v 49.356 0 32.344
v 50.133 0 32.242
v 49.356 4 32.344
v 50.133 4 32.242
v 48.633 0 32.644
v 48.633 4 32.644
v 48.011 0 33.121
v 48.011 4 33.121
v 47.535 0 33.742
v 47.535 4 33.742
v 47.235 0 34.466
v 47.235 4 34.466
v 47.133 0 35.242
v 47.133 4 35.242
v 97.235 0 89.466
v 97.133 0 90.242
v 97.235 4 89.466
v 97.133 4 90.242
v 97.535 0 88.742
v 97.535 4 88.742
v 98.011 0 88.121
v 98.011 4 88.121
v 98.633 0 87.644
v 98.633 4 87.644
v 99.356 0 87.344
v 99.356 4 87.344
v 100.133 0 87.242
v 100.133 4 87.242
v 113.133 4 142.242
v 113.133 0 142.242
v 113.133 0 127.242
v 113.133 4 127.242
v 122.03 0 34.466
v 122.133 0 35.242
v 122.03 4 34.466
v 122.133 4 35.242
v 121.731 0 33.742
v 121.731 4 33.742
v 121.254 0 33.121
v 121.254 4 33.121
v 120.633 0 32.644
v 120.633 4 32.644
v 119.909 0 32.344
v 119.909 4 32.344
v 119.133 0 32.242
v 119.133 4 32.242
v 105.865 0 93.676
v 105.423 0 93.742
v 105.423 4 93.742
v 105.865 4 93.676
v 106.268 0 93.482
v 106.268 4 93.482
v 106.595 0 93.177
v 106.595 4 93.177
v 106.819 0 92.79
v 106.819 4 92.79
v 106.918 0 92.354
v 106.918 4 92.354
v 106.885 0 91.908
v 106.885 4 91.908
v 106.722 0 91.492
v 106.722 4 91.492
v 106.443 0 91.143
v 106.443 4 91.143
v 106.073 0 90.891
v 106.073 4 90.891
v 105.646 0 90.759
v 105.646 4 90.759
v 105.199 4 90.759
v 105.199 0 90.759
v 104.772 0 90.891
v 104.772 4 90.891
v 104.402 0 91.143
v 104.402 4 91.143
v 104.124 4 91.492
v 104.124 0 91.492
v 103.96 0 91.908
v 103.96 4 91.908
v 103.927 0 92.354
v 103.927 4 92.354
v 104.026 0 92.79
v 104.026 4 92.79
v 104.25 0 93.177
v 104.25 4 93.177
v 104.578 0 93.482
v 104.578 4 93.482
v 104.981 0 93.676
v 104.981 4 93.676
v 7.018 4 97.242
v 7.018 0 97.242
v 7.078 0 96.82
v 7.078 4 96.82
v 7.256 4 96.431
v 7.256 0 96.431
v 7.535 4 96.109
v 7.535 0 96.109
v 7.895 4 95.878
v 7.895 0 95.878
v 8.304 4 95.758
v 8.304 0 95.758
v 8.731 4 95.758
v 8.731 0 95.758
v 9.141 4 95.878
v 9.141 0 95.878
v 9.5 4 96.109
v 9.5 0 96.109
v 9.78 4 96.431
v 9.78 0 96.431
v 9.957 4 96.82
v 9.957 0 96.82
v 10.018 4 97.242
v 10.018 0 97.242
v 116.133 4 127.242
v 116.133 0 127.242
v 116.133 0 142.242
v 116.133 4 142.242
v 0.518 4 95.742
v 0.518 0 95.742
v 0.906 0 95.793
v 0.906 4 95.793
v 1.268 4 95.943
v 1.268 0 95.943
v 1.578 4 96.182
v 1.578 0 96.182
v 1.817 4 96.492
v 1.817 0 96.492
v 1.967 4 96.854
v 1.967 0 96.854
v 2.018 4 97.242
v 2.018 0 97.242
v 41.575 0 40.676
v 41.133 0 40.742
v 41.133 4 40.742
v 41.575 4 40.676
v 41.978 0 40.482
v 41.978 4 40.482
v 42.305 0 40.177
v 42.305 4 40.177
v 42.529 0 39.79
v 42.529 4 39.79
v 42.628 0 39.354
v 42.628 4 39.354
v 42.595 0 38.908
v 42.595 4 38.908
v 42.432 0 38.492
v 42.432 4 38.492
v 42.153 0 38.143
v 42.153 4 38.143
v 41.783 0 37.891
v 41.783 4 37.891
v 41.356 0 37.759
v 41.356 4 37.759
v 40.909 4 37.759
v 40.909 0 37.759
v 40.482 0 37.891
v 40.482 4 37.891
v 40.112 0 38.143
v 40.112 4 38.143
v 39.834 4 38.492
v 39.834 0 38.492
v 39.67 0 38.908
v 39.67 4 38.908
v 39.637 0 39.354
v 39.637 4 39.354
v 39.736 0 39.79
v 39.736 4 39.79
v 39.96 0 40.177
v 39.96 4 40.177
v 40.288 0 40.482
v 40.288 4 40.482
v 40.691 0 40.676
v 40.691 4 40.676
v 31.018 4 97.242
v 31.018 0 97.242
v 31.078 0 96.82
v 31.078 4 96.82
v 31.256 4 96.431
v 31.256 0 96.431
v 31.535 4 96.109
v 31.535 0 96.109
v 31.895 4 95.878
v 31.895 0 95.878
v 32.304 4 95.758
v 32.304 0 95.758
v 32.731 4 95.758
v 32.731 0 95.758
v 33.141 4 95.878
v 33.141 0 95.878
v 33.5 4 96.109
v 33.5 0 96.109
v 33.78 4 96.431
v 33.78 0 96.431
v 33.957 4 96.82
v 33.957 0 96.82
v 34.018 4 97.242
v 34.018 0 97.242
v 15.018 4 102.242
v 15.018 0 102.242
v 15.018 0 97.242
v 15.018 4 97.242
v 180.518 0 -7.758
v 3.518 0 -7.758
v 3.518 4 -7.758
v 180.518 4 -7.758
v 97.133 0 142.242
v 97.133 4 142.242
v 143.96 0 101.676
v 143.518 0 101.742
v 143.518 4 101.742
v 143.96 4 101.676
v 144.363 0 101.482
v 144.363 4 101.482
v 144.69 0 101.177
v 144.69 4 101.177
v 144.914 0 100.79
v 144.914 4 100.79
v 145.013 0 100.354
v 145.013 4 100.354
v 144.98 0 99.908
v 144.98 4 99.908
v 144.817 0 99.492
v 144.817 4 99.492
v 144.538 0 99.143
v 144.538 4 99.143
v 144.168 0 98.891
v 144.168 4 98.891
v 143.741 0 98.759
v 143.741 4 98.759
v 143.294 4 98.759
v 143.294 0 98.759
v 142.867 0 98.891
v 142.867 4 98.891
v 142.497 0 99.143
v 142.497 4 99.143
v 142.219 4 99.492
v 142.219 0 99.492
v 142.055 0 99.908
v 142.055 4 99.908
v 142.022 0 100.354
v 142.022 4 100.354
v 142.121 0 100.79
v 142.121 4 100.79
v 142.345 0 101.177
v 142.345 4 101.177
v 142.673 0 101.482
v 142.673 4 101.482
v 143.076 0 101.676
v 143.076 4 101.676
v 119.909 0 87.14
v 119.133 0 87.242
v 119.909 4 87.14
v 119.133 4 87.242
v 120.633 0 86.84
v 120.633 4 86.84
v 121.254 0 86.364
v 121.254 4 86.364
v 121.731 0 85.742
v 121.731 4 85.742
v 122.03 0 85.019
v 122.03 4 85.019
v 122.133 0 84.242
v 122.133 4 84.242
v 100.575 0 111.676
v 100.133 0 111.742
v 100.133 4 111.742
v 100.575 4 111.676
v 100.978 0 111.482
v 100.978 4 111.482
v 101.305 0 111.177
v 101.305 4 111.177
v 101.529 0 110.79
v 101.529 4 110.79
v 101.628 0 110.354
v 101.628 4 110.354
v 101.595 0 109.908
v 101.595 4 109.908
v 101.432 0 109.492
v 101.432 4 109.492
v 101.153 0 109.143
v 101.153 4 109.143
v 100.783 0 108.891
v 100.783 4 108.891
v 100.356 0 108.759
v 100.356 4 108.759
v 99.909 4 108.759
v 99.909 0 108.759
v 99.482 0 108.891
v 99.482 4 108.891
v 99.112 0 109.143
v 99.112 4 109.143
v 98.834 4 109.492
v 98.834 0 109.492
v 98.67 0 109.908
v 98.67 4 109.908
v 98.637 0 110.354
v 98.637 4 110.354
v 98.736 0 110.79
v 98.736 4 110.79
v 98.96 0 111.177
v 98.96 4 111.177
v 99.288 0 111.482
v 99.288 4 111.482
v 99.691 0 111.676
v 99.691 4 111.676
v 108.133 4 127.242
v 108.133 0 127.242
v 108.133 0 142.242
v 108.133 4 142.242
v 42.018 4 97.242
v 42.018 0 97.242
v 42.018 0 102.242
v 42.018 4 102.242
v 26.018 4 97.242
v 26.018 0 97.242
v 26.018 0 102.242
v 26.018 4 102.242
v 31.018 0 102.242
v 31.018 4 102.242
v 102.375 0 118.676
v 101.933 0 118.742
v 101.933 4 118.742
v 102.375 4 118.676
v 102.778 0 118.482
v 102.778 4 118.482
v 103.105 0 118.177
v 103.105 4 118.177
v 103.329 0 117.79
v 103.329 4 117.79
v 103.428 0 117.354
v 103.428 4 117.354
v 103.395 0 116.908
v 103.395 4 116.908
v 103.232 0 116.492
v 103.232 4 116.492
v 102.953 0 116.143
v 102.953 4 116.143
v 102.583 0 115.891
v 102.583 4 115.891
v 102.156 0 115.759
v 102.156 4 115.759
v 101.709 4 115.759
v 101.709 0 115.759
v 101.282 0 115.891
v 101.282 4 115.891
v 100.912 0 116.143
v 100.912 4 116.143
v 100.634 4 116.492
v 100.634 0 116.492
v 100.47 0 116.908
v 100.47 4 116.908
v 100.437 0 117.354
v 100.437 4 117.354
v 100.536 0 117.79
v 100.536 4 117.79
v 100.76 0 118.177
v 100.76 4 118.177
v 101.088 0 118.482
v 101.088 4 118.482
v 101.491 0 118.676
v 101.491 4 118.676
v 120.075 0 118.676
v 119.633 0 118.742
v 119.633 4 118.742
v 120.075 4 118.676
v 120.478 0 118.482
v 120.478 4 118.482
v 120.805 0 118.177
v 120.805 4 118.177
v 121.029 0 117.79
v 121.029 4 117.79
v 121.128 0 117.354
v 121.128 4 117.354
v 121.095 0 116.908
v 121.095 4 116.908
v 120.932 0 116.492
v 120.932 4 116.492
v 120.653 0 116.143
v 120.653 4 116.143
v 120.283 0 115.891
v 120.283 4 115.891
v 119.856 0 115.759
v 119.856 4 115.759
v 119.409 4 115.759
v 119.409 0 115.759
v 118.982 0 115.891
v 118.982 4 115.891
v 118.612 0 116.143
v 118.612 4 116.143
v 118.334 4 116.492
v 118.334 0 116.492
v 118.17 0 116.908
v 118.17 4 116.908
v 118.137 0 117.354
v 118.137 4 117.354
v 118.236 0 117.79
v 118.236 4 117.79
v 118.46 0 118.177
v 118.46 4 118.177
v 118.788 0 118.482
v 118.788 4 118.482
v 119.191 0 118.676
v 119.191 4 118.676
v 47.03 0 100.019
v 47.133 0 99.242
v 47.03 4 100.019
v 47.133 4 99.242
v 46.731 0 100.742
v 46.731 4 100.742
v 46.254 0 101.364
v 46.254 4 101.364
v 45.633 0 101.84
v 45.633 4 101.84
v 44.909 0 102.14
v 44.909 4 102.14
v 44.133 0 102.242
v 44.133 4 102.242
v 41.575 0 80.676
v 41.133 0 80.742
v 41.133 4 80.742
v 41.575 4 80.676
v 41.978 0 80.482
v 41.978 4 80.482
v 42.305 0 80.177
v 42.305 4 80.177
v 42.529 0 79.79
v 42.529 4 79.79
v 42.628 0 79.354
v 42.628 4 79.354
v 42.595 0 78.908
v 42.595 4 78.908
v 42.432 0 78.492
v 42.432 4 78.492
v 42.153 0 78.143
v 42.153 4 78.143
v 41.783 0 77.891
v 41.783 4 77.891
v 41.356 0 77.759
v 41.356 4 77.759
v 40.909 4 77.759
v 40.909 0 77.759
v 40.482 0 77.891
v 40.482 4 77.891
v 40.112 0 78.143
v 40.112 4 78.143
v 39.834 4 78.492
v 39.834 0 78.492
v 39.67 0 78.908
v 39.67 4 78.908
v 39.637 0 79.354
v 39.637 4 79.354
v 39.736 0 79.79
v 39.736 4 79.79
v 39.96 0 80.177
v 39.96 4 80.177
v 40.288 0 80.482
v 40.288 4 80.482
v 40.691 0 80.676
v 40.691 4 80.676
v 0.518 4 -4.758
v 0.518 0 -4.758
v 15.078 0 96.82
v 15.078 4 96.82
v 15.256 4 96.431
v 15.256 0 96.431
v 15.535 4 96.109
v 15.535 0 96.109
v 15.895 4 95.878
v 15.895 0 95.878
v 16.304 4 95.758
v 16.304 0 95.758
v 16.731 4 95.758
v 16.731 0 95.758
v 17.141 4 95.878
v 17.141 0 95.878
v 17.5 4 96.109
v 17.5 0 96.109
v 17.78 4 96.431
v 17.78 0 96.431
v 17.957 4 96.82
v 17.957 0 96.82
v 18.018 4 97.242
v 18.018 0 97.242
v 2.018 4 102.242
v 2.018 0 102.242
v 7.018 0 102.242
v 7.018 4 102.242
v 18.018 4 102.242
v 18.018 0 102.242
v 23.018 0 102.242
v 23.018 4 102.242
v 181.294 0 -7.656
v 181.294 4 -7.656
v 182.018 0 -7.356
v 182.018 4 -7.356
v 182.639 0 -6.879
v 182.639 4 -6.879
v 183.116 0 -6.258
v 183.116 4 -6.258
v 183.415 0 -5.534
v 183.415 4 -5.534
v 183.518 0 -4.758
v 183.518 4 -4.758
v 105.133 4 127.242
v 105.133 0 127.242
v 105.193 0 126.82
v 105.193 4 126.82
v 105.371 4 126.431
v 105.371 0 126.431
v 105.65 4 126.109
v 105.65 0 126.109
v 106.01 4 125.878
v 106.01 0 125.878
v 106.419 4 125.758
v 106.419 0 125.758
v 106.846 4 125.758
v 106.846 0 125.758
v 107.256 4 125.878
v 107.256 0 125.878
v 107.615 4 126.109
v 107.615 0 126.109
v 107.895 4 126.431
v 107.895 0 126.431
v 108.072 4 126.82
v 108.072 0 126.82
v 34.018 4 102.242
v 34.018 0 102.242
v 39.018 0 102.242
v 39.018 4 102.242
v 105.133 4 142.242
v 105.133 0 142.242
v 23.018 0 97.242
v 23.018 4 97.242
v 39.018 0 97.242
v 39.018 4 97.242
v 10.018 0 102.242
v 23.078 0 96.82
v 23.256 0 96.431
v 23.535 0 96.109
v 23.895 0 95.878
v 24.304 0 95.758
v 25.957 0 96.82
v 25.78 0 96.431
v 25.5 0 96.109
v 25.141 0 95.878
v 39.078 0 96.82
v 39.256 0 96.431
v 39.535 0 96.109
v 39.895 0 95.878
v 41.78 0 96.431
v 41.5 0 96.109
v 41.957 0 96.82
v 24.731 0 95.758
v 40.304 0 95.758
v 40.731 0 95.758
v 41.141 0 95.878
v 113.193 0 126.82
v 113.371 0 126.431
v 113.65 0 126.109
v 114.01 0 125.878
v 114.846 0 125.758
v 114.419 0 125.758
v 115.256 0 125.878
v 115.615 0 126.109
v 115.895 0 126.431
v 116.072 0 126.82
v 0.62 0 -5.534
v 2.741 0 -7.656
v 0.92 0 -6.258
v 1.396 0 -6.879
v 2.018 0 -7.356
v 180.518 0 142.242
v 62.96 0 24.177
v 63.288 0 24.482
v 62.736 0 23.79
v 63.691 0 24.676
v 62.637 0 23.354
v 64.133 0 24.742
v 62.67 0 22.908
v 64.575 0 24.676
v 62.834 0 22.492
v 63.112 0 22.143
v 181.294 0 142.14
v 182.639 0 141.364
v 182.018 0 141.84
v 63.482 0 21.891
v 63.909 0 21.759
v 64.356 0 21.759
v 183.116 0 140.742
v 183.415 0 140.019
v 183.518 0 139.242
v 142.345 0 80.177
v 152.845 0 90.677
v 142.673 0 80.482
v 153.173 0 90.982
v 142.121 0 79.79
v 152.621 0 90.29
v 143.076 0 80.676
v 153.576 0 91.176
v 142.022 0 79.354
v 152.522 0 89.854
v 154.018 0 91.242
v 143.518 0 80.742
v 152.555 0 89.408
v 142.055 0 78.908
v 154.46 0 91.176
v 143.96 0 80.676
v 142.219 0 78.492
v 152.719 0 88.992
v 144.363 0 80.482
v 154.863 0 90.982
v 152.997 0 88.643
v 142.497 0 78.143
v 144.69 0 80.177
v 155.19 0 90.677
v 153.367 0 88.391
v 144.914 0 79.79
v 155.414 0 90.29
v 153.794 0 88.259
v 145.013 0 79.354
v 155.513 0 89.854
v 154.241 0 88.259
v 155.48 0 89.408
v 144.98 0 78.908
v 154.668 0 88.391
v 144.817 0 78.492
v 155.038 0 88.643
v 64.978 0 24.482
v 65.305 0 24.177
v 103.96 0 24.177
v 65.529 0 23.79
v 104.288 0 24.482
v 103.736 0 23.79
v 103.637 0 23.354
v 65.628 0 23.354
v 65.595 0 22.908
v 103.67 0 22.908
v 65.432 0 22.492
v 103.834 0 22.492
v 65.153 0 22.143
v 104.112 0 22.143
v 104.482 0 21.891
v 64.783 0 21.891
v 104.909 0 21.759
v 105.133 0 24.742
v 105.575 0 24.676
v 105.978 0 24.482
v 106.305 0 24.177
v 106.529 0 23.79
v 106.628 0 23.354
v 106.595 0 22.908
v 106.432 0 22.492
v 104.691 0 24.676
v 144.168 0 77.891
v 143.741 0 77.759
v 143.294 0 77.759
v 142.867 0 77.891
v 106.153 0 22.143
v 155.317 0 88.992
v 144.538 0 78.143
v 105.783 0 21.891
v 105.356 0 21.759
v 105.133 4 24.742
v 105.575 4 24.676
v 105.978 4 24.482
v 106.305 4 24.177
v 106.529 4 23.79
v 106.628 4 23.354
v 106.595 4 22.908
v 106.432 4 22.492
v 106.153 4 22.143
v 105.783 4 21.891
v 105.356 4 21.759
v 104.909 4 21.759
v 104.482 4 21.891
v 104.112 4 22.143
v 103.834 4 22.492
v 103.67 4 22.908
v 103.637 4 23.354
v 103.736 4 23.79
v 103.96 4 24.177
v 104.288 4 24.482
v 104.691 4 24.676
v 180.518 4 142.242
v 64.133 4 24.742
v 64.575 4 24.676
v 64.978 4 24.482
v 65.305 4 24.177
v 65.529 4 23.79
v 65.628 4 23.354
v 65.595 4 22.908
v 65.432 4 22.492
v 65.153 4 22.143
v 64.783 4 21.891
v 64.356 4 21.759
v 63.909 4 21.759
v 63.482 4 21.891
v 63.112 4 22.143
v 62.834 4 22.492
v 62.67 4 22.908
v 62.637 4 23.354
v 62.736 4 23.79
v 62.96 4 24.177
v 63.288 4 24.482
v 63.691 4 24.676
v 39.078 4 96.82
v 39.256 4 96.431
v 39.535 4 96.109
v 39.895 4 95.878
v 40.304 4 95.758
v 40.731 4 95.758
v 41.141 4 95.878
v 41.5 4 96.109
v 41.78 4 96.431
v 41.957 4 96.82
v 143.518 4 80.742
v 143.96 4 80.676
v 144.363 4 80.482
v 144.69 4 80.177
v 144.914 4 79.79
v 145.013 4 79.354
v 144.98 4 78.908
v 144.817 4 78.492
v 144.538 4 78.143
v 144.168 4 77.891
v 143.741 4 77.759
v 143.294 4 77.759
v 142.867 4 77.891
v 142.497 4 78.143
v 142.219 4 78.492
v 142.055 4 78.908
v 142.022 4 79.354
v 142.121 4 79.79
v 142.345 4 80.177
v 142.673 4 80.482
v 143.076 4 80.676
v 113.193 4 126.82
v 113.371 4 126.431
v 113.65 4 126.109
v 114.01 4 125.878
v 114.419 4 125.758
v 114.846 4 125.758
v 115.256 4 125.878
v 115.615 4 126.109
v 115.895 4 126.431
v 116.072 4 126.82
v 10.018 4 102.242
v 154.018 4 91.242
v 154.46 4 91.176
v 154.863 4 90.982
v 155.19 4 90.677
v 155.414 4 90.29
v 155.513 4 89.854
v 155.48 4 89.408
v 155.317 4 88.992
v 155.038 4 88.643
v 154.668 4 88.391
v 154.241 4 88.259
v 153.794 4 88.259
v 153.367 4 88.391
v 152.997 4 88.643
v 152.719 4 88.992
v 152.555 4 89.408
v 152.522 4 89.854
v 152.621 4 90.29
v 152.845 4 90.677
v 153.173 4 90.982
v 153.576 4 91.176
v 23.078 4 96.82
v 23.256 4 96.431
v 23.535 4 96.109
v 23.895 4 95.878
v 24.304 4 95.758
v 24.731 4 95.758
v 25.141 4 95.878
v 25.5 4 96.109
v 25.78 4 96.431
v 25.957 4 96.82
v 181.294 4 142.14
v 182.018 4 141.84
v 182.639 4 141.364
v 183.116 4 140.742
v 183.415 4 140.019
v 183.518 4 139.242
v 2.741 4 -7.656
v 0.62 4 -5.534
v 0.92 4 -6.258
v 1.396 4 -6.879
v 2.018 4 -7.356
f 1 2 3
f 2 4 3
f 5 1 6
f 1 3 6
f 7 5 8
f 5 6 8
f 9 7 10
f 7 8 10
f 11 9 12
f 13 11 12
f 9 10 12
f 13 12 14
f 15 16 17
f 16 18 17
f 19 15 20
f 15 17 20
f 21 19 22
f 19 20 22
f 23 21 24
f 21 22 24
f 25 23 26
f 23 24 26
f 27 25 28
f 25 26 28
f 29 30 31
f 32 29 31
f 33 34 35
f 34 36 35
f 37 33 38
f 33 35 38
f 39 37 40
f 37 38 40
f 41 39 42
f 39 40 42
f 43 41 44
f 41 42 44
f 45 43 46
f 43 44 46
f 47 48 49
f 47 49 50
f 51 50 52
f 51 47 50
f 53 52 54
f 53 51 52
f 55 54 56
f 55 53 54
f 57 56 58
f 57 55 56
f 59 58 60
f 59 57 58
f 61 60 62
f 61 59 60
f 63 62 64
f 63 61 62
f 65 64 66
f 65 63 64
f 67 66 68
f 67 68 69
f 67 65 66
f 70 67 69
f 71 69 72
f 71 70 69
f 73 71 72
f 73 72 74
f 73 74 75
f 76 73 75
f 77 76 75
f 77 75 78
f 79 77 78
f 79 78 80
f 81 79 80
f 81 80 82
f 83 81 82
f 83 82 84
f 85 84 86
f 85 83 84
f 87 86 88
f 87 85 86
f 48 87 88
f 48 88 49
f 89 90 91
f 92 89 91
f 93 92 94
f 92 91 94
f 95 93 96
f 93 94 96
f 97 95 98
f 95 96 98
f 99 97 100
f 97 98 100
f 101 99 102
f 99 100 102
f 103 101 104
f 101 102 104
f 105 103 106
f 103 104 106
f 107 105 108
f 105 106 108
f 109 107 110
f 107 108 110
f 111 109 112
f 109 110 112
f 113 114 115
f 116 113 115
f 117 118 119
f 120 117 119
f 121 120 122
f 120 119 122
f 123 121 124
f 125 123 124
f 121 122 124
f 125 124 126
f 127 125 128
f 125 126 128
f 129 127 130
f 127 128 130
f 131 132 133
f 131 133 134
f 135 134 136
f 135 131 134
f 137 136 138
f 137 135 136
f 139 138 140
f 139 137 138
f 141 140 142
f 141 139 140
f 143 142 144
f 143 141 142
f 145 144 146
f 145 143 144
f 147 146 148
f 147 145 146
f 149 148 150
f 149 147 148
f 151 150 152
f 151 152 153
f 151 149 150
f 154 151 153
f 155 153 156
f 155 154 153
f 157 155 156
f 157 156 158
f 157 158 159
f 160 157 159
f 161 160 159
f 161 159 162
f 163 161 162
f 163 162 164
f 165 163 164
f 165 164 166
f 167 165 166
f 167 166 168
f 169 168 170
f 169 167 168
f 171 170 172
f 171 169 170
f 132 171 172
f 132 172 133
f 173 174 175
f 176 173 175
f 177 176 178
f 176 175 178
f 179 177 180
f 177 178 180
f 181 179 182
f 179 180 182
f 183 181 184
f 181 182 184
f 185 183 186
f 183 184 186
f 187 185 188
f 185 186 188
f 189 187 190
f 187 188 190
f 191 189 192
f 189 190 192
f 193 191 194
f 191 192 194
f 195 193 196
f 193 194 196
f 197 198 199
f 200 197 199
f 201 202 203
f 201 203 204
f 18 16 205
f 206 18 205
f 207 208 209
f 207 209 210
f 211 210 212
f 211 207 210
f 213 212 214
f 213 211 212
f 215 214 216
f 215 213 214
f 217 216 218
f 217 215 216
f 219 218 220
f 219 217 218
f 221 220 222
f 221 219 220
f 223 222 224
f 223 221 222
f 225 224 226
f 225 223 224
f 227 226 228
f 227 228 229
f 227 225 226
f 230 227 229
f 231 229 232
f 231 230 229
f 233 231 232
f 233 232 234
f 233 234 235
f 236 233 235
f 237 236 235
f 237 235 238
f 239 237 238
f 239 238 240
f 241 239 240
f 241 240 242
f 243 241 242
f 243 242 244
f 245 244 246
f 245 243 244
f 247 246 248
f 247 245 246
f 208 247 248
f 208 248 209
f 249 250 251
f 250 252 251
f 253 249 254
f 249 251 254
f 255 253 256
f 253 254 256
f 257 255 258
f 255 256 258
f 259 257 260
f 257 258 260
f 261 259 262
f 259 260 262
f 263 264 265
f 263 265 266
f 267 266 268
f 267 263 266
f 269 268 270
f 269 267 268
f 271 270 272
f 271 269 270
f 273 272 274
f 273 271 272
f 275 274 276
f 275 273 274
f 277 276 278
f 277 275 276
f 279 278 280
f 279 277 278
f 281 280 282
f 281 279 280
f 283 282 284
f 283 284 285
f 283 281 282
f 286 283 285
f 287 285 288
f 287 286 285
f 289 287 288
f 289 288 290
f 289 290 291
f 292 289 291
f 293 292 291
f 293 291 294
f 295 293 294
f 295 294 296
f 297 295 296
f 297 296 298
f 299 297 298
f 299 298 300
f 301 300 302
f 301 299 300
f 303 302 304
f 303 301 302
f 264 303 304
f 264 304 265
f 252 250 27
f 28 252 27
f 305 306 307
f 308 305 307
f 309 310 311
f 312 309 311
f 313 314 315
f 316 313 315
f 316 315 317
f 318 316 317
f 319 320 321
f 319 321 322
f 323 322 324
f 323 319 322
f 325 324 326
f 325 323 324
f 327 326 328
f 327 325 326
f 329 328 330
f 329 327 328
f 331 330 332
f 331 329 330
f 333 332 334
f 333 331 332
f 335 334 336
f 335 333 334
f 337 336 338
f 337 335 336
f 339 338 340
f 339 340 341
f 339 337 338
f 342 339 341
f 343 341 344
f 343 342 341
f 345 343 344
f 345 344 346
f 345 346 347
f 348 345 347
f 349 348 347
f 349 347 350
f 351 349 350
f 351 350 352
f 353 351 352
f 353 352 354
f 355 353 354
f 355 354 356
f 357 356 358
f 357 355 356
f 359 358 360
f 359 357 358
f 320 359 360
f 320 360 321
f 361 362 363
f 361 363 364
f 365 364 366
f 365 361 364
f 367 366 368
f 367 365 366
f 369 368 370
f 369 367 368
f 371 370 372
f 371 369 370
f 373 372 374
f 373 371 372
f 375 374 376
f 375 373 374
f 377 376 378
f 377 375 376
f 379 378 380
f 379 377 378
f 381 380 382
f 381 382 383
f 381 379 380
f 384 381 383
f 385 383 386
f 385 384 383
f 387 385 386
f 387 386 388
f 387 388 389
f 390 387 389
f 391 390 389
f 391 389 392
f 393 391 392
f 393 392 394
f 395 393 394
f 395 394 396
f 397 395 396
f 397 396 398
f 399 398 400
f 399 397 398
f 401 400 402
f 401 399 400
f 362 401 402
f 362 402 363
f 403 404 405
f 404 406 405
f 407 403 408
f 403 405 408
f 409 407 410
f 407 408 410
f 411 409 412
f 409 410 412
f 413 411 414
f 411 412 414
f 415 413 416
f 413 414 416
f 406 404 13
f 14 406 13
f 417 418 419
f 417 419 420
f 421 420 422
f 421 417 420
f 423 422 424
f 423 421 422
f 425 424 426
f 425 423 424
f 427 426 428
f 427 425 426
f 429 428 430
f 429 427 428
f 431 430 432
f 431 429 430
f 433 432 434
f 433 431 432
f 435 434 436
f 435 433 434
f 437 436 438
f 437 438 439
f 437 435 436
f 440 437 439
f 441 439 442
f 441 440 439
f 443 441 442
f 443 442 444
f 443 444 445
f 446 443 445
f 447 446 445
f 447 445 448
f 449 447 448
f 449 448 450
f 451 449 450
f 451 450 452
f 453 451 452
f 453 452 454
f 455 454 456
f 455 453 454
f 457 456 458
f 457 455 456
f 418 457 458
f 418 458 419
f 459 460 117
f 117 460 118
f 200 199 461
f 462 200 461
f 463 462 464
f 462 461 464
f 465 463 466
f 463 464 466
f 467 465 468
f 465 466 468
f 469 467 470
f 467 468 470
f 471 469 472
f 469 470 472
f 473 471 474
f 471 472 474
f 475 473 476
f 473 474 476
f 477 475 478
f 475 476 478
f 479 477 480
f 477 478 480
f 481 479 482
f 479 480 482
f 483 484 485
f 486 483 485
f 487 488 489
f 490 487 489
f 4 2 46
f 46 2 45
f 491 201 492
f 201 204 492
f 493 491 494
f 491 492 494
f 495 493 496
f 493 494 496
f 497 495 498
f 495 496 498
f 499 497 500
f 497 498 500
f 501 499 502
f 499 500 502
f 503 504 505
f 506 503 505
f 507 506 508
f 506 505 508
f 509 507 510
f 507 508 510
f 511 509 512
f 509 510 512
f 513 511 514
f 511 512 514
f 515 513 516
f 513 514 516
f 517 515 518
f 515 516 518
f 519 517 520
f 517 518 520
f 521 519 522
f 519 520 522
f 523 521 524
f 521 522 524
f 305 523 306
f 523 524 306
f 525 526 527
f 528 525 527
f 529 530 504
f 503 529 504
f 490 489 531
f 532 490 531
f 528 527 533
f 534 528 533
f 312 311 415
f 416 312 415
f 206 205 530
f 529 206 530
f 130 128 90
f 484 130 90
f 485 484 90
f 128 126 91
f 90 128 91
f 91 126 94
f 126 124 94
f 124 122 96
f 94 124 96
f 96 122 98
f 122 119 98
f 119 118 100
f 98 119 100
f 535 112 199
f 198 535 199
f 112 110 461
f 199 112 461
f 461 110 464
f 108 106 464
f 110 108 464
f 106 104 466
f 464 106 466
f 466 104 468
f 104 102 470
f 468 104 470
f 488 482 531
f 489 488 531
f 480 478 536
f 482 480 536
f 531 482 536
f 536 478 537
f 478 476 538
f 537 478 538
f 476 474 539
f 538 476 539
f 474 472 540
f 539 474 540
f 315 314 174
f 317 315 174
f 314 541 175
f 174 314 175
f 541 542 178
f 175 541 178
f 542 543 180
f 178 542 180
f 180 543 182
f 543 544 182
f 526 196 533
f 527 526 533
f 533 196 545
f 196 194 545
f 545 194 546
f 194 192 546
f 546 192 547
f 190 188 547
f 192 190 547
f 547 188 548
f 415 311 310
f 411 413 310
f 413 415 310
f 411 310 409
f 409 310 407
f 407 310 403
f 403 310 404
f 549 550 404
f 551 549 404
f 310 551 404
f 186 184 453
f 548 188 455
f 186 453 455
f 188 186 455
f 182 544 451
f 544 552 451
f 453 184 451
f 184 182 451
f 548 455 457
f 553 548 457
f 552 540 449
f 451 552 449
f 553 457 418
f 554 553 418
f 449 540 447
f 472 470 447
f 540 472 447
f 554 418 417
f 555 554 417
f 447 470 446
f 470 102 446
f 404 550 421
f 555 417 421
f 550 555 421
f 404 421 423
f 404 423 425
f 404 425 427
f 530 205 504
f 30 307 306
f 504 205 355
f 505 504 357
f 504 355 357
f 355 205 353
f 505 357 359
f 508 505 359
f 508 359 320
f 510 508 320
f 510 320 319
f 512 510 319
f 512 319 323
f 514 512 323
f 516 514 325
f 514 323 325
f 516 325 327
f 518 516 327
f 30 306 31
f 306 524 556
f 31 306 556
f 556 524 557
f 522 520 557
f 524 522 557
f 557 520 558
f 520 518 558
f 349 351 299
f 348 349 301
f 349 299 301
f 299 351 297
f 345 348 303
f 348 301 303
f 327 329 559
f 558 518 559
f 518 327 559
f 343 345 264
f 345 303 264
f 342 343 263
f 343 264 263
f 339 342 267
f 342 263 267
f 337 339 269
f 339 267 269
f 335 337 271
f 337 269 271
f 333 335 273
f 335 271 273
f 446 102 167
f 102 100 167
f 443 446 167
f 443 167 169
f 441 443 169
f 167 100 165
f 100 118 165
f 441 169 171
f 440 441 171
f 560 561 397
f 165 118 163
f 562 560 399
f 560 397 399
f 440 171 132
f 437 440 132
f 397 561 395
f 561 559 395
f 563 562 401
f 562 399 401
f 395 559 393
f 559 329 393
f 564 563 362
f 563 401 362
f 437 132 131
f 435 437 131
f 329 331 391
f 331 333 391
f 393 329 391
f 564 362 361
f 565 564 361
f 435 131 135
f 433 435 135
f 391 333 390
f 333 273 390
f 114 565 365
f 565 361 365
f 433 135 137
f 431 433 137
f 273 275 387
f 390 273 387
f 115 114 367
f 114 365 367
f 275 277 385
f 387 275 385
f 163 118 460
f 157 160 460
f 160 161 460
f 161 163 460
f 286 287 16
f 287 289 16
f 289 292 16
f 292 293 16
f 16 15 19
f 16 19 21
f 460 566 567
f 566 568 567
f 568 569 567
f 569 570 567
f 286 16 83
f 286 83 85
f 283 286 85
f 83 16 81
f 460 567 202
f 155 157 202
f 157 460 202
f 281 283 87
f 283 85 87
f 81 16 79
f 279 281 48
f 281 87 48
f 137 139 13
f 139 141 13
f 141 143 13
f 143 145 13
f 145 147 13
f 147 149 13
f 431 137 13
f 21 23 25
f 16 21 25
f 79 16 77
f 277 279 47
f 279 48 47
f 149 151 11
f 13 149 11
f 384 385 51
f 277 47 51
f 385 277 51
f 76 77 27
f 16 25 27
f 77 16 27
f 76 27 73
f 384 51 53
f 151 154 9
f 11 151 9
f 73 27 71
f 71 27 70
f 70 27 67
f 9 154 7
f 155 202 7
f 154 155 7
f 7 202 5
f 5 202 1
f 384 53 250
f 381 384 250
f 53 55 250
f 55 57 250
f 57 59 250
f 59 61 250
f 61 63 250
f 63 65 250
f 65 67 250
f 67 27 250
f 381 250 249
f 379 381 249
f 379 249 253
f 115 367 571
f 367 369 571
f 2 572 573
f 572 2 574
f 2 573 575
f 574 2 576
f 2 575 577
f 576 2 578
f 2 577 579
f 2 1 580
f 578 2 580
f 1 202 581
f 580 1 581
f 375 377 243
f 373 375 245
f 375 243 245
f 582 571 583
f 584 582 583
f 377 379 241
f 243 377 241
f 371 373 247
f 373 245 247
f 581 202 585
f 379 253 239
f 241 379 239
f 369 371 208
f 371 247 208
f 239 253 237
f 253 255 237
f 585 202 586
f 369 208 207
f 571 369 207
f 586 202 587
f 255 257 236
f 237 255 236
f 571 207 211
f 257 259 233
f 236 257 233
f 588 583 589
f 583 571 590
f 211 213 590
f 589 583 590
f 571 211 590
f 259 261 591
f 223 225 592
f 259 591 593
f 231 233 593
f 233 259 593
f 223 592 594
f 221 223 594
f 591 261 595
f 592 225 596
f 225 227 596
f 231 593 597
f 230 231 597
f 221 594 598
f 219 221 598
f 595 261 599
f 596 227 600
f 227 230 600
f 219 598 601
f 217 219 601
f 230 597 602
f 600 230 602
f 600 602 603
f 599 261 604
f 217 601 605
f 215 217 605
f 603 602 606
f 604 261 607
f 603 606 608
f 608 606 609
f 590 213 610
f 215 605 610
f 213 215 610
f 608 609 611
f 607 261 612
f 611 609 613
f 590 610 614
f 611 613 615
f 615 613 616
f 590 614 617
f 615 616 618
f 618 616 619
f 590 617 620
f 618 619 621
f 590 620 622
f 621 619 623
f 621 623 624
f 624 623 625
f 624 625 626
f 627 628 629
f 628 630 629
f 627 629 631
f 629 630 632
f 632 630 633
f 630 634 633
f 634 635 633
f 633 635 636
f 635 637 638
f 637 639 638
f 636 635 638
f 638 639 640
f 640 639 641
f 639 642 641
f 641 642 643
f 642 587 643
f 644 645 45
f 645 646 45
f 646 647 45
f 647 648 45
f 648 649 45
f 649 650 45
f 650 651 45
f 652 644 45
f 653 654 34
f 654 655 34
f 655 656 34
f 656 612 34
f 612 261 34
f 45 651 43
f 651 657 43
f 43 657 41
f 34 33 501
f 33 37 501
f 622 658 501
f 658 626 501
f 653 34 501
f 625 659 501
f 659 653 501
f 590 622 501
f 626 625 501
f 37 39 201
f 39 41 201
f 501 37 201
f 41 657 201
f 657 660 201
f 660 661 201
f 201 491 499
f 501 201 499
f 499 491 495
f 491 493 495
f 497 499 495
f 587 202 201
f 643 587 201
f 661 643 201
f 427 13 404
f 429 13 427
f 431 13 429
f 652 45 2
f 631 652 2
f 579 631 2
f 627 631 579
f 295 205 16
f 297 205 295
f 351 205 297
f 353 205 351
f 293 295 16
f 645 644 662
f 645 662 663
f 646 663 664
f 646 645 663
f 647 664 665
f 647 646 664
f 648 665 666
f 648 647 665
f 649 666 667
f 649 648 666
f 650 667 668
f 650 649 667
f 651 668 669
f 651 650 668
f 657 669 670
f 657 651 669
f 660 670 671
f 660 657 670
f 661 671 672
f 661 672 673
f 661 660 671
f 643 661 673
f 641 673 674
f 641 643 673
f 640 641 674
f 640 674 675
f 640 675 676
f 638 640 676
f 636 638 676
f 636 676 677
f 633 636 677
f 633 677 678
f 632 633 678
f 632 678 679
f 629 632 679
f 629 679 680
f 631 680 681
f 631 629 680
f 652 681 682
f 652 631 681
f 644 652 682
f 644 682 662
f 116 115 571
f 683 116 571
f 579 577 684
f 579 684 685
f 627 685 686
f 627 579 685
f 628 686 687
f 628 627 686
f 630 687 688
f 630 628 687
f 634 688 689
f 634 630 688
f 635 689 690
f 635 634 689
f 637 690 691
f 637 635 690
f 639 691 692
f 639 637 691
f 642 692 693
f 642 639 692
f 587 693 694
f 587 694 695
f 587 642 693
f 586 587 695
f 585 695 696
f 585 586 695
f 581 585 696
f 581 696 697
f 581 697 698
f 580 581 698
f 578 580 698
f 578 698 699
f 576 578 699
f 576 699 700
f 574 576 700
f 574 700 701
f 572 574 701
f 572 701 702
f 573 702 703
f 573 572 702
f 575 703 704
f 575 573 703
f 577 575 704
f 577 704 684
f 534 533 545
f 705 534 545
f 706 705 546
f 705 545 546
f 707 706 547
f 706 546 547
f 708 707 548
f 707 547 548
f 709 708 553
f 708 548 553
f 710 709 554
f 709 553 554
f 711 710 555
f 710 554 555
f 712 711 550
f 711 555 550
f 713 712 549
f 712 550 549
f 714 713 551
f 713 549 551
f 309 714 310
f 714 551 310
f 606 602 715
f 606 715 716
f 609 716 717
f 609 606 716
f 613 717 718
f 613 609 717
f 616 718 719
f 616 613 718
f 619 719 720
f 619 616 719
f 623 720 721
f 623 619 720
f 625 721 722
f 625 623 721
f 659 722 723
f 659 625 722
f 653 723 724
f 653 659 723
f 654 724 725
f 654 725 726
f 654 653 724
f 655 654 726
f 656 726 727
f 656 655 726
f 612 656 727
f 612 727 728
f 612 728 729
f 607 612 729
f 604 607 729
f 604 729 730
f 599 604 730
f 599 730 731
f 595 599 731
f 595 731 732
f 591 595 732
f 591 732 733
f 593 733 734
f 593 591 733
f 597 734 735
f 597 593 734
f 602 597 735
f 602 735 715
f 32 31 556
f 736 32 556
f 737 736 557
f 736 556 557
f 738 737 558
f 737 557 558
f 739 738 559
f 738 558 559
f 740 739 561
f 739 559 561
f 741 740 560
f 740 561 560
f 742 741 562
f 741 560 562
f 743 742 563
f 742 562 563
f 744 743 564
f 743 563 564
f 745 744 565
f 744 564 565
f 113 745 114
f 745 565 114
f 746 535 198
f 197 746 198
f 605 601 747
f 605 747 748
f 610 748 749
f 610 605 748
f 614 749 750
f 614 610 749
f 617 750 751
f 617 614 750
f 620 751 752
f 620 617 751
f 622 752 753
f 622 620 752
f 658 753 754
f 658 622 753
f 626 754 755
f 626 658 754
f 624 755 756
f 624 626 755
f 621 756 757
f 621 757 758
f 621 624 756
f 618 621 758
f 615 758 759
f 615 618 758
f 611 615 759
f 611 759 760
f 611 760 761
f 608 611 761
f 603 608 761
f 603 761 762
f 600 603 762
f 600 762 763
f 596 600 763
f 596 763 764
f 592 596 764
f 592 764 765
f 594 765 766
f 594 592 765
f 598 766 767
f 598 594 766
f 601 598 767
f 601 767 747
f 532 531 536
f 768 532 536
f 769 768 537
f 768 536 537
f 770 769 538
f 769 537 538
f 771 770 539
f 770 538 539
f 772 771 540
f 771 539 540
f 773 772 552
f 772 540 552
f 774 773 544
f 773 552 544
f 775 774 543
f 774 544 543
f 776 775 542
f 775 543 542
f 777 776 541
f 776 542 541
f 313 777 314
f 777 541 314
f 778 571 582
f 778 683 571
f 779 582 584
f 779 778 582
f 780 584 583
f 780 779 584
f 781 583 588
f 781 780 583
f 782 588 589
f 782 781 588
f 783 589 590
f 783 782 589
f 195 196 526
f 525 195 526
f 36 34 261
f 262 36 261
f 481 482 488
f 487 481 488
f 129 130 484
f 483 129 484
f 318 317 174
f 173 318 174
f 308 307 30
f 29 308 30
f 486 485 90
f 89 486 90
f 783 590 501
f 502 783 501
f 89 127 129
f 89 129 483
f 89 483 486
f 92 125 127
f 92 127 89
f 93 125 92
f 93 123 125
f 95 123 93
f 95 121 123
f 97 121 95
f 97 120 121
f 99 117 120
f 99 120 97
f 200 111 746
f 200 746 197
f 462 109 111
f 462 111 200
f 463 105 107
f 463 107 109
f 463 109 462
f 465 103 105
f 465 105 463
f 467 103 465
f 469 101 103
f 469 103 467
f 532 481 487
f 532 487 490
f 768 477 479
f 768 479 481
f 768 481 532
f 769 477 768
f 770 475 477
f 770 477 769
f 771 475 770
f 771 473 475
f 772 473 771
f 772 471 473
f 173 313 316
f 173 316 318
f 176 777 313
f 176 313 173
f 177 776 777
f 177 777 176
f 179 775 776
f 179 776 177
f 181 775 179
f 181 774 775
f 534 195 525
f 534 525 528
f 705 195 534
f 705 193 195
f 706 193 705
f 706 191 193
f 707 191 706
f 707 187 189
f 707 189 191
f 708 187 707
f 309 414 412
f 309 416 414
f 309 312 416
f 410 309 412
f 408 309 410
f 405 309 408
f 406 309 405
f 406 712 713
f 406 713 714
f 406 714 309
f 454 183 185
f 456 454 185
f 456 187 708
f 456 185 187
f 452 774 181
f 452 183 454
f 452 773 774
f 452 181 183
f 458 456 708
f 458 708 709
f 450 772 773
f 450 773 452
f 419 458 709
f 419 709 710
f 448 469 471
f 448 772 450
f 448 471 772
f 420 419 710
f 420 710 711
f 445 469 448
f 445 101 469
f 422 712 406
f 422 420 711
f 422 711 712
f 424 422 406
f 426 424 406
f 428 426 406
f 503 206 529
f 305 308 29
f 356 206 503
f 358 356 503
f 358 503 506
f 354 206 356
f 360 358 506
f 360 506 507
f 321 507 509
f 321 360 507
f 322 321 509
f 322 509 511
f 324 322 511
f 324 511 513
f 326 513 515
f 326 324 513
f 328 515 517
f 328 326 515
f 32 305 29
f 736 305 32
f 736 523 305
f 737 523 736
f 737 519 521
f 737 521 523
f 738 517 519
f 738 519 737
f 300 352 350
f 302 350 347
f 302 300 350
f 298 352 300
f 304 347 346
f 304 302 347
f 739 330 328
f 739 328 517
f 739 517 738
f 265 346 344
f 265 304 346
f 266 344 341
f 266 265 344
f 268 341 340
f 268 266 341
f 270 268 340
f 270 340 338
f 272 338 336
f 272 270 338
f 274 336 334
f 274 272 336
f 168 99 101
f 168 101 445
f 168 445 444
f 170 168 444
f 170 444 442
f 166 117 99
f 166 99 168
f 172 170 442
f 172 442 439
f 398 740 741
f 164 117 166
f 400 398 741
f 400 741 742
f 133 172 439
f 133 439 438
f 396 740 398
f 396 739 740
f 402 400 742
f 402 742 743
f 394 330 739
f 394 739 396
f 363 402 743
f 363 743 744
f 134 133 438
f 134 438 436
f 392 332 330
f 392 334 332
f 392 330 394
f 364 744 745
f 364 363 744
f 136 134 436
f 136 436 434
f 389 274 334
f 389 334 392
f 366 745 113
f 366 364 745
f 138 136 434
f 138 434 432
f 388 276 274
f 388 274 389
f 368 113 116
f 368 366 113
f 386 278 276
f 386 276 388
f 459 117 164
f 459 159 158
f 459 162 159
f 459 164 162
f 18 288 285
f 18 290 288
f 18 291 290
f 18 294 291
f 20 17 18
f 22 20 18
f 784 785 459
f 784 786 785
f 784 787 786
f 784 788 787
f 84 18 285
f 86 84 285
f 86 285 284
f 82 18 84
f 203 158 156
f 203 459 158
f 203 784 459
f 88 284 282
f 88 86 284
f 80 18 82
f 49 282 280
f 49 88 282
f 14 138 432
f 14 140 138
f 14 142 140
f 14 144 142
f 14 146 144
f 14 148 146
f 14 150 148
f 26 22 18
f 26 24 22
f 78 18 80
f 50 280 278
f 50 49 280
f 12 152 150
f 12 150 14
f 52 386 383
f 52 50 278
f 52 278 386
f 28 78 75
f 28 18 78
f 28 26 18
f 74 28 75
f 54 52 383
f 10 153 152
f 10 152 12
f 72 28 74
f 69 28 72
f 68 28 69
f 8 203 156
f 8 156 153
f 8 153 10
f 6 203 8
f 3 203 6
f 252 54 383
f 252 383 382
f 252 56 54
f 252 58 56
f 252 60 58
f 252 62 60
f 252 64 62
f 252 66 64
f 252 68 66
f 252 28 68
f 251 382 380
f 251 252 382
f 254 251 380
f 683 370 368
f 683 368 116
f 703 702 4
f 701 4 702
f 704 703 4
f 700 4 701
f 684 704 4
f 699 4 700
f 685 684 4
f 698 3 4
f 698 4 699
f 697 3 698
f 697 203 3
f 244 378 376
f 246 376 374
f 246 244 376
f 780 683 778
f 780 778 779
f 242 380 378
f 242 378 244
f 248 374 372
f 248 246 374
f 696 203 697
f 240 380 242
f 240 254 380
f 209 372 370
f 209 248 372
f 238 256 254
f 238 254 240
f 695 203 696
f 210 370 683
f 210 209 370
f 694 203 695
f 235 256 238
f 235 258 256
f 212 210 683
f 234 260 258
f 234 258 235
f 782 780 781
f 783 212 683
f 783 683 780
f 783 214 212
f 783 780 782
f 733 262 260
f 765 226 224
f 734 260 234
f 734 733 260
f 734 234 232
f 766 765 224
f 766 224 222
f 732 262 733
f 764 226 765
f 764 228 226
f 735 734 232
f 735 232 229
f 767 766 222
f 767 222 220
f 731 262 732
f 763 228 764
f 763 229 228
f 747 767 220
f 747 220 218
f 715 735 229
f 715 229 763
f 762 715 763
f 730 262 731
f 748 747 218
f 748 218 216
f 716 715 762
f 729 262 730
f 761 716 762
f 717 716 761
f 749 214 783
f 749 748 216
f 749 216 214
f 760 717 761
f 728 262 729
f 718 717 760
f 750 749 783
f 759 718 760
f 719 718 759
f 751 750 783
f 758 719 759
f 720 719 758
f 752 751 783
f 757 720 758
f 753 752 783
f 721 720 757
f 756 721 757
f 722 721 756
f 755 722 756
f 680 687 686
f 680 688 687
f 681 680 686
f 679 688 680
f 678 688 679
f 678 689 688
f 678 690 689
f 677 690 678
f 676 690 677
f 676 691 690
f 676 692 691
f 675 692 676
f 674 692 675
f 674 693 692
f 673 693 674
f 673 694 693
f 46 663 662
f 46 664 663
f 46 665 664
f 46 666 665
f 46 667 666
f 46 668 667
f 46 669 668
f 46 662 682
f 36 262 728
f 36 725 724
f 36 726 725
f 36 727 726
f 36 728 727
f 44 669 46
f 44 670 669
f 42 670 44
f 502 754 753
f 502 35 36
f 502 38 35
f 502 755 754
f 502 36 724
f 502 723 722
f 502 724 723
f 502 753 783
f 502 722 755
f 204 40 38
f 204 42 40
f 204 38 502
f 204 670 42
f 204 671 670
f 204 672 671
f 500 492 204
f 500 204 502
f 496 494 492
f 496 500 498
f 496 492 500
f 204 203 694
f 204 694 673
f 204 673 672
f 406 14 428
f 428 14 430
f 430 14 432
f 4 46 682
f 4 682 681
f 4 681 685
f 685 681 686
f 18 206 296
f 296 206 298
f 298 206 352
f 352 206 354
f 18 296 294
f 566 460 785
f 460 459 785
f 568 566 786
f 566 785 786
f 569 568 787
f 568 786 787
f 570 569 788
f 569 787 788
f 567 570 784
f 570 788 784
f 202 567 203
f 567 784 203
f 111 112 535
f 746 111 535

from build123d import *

# Parameters (mm, degrees)
SKETCH_1_R      = 1.5
EXTRUDE_3_DEPTH = 4
SKETCH_1_8_W    = 25
SKETCH_1_8_H    = 150
EXTRUDE_4_DEPTH = 4
FILLET_1_R      = 3


with BuildPart() as part:
    # 草图1 → 凸台-拉伸3 (new body)
    with BuildSketch(Plane(origin=(0, 0, 0), x_dir=(1, 0, 0), z_dir=(0, 1, 0))):
        with BuildLine():
            Line((97.132652086, -142.242252719), (105.132652086, -142.242252719))
            Line((105.132652086, -142.242252719), (105.132652086, -127.242252719))
            ThreePointArc((105.132652086, -127.242252719), (106.632652086, -125.742252719), (108.132652086, -127.242252719))
            Line((108.132652086, -127.242252719), (108.132652086, -142.242252719))
            Line((108.132652086, -142.242252719), (113.132652086, -142.242252719))
            Line((113.132652086, -142.242252719), (113.132652086, -127.242252719))
            ThreePointArc((113.132652086, -127.242252719), (114.632652086, -125.742252719), (116.132652086, -127.242252719))
            Line((116.132652086, -127.242252719), (116.132652086, -142.242252719))
            Line((116.132652086, -142.242252719), (158.517652086, -142.242252719))
            Line((158.517652086, -142.242252719), (158.517652086, 7.757747281))
            Line((158.517652086, 7.757747281), (0.517652086, 7.757747281))
            Line((0.517652086, 7.757747281), (0.517652086, -95.742252719))
            ThreePointArc((0.517652086, -95.742252719), (1.578312257, -96.181592547), (2.017652086, -97.242252719))
            Line((2.017652086, -97.242252719), (2.017652086, -102.242252719))
            Line((2.017652086, -102.242252719), (7.017652086, -102.242252719))
            Line((7.017652086, -102.242252719), (7.017652086, -97.242252719))
            ThreePointArc((7.017652086, -97.242252719), (8.517652086, -95.742252719), (10.017652086, -97.242252719))
            Line((10.017652086, -97.242252719), (10.017652086, -102.242252719))
            Line((10.017652086, -102.242252719), (15.017652086, -102.242252719))
            Line((15.017652086, -102.242252719), (15.017652086, -97.242252719))
            ThreePointArc((15.017652086, -97.242252719), (16.517652086, -95.742252719), (18.017652086, -97.242252719))
            Line((18.017652086, -97.242252719), (18.017652086, -102.242252719))
            Line((18.017652086, -102.242252719), (23.017652086, -102.242252719))
            Line((23.017652086, -102.242252719), (23.017652086, -97.242252719))
            ThreePointArc((23.017652086, -97.242252719), (24.517652086, -95.742252719), (26.017652086, -97.242252719))
            Line((26.017652086, -97.242252719), (26.017652086, -102.242252719))
            Line((26.017652086, -102.242252719), (31.017652086, -102.242252719))
            Line((31.017652086, -102.242252719), (31.017652086, -97.242252719))
            ThreePointArc((31.017652086, -97.242252719), (32.517652086, -95.742252719), (34.017652086, -97.242252719))
            Line((34.017652086, -97.242252719), (34.017652086, -102.242252719))
            Line((34.017652086, -102.242252719), (39.017652086, -102.242252719))
            Line((39.017652086, -102.242252719), (39.017652086, -97.242252719))
            ThreePointArc((39.017652086, -97.242252719), (40.517652086, -95.742252719), (42.017652086, -97.242252719))
            Line((42.017652086, -97.242252719), (42.017652086, -102.242252719))
            Line((42.017652086, -102.242252719), (47.132652086, -102.242252719))
            Line((47.132652086, -102.242252719), (47.132652086, -32.242252719))
            Line((47.132652086, -32.242252719), (122.132652086, -32.242252719))
            Line((122.132652086, -32.242252719), (122.132652086, -87.242252719))
            Line((122.132652086, -87.242252719), (97.132652086, -87.242252719))
            Line((97.132652086, -87.242252719), (97.132652086, -142.242252719))
        make_face()
        with Locations((101.932652086, -117.242252719)):
            Circle(SKETCH_1_R, mode=Mode.SUBTRACT)
        with Locations((119.632652086, -117.242252719)):
            Circle(SKETCH_1_R, mode=Mode.SUBTRACT)
        with Locations((105.422652086, -92.242252719)):
            Circle(SKETCH_1_R, mode=Mode.SUBTRACT)
        with Locations((100.132652086, -110.242252719)):
            Circle(SKETCH_1_R, mode=Mode.SUBTRACT)
        with Locations((105.132652086, -23.242252719)):
            Circle(SKETCH_1_R, mode=Mode.SUBTRACT)
        with Locations((41.132652086, -79.242252719)):
            Circle(SKETCH_1_R, mode=Mode.SUBTRACT)
        with Locations((143.517652086, -100.242252719)):
            Circle(SKETCH_1_R, mode=Mode.SUBTRACT)
        with Locations((154.017652086, -89.742252719)):
            Circle(SKETCH_1_R, mode=Mode.SUBTRACT)
        with Locations((143.517652086, -79.242252719)):
            Circle(SKETCH_1_R, mode=Mode.SUBTRACT)
        with Locations((41.132652086, -39.242252719)):
            Circle(SKETCH_1_R, mode=Mode.SUBTRACT)
        with Locations((64.132652086, -23.242252719)):
            Circle(SKETCH_1_R, mode=Mode.SUBTRACT)
    extrude(amount=EXTRUDE_3_DEPTH)

    # 草图1<8> → 凸台-拉伸4 (add)
    with BuildSketch(Plane(origin=(0, 0, 0), x_dir=(1, 0, 0), z_dir=(0, 1, 0))):
        with Locations((171.017652086, -67.242252719)):
            Rectangle(SKETCH_1_8_W, SKETCH_1_8_H)
    extrude(amount=EXTRUDE_4_DEPTH)

    # 圆角1
    fillet_1_edges = [part.edges().sort_by_distance(p)[0] for p in [
        (47.132652086, 2, 32.242252719),
        (122.132652086, 2, 32.242252719),
        (122.132652086, 2, 87.242252719),
        (97.132652086, 2, 87.242252719),
        (47.132652086, 2, 102.242252719),
        (183.517652086, 2, -7.757747281),
        (0.517652086, 2, -7.757747281),
        (183.517652086, 2, 142.242252719),
    ]]
    fillet(fillet_1_edges, radius=FILLET_1_R)


solid = part.part
